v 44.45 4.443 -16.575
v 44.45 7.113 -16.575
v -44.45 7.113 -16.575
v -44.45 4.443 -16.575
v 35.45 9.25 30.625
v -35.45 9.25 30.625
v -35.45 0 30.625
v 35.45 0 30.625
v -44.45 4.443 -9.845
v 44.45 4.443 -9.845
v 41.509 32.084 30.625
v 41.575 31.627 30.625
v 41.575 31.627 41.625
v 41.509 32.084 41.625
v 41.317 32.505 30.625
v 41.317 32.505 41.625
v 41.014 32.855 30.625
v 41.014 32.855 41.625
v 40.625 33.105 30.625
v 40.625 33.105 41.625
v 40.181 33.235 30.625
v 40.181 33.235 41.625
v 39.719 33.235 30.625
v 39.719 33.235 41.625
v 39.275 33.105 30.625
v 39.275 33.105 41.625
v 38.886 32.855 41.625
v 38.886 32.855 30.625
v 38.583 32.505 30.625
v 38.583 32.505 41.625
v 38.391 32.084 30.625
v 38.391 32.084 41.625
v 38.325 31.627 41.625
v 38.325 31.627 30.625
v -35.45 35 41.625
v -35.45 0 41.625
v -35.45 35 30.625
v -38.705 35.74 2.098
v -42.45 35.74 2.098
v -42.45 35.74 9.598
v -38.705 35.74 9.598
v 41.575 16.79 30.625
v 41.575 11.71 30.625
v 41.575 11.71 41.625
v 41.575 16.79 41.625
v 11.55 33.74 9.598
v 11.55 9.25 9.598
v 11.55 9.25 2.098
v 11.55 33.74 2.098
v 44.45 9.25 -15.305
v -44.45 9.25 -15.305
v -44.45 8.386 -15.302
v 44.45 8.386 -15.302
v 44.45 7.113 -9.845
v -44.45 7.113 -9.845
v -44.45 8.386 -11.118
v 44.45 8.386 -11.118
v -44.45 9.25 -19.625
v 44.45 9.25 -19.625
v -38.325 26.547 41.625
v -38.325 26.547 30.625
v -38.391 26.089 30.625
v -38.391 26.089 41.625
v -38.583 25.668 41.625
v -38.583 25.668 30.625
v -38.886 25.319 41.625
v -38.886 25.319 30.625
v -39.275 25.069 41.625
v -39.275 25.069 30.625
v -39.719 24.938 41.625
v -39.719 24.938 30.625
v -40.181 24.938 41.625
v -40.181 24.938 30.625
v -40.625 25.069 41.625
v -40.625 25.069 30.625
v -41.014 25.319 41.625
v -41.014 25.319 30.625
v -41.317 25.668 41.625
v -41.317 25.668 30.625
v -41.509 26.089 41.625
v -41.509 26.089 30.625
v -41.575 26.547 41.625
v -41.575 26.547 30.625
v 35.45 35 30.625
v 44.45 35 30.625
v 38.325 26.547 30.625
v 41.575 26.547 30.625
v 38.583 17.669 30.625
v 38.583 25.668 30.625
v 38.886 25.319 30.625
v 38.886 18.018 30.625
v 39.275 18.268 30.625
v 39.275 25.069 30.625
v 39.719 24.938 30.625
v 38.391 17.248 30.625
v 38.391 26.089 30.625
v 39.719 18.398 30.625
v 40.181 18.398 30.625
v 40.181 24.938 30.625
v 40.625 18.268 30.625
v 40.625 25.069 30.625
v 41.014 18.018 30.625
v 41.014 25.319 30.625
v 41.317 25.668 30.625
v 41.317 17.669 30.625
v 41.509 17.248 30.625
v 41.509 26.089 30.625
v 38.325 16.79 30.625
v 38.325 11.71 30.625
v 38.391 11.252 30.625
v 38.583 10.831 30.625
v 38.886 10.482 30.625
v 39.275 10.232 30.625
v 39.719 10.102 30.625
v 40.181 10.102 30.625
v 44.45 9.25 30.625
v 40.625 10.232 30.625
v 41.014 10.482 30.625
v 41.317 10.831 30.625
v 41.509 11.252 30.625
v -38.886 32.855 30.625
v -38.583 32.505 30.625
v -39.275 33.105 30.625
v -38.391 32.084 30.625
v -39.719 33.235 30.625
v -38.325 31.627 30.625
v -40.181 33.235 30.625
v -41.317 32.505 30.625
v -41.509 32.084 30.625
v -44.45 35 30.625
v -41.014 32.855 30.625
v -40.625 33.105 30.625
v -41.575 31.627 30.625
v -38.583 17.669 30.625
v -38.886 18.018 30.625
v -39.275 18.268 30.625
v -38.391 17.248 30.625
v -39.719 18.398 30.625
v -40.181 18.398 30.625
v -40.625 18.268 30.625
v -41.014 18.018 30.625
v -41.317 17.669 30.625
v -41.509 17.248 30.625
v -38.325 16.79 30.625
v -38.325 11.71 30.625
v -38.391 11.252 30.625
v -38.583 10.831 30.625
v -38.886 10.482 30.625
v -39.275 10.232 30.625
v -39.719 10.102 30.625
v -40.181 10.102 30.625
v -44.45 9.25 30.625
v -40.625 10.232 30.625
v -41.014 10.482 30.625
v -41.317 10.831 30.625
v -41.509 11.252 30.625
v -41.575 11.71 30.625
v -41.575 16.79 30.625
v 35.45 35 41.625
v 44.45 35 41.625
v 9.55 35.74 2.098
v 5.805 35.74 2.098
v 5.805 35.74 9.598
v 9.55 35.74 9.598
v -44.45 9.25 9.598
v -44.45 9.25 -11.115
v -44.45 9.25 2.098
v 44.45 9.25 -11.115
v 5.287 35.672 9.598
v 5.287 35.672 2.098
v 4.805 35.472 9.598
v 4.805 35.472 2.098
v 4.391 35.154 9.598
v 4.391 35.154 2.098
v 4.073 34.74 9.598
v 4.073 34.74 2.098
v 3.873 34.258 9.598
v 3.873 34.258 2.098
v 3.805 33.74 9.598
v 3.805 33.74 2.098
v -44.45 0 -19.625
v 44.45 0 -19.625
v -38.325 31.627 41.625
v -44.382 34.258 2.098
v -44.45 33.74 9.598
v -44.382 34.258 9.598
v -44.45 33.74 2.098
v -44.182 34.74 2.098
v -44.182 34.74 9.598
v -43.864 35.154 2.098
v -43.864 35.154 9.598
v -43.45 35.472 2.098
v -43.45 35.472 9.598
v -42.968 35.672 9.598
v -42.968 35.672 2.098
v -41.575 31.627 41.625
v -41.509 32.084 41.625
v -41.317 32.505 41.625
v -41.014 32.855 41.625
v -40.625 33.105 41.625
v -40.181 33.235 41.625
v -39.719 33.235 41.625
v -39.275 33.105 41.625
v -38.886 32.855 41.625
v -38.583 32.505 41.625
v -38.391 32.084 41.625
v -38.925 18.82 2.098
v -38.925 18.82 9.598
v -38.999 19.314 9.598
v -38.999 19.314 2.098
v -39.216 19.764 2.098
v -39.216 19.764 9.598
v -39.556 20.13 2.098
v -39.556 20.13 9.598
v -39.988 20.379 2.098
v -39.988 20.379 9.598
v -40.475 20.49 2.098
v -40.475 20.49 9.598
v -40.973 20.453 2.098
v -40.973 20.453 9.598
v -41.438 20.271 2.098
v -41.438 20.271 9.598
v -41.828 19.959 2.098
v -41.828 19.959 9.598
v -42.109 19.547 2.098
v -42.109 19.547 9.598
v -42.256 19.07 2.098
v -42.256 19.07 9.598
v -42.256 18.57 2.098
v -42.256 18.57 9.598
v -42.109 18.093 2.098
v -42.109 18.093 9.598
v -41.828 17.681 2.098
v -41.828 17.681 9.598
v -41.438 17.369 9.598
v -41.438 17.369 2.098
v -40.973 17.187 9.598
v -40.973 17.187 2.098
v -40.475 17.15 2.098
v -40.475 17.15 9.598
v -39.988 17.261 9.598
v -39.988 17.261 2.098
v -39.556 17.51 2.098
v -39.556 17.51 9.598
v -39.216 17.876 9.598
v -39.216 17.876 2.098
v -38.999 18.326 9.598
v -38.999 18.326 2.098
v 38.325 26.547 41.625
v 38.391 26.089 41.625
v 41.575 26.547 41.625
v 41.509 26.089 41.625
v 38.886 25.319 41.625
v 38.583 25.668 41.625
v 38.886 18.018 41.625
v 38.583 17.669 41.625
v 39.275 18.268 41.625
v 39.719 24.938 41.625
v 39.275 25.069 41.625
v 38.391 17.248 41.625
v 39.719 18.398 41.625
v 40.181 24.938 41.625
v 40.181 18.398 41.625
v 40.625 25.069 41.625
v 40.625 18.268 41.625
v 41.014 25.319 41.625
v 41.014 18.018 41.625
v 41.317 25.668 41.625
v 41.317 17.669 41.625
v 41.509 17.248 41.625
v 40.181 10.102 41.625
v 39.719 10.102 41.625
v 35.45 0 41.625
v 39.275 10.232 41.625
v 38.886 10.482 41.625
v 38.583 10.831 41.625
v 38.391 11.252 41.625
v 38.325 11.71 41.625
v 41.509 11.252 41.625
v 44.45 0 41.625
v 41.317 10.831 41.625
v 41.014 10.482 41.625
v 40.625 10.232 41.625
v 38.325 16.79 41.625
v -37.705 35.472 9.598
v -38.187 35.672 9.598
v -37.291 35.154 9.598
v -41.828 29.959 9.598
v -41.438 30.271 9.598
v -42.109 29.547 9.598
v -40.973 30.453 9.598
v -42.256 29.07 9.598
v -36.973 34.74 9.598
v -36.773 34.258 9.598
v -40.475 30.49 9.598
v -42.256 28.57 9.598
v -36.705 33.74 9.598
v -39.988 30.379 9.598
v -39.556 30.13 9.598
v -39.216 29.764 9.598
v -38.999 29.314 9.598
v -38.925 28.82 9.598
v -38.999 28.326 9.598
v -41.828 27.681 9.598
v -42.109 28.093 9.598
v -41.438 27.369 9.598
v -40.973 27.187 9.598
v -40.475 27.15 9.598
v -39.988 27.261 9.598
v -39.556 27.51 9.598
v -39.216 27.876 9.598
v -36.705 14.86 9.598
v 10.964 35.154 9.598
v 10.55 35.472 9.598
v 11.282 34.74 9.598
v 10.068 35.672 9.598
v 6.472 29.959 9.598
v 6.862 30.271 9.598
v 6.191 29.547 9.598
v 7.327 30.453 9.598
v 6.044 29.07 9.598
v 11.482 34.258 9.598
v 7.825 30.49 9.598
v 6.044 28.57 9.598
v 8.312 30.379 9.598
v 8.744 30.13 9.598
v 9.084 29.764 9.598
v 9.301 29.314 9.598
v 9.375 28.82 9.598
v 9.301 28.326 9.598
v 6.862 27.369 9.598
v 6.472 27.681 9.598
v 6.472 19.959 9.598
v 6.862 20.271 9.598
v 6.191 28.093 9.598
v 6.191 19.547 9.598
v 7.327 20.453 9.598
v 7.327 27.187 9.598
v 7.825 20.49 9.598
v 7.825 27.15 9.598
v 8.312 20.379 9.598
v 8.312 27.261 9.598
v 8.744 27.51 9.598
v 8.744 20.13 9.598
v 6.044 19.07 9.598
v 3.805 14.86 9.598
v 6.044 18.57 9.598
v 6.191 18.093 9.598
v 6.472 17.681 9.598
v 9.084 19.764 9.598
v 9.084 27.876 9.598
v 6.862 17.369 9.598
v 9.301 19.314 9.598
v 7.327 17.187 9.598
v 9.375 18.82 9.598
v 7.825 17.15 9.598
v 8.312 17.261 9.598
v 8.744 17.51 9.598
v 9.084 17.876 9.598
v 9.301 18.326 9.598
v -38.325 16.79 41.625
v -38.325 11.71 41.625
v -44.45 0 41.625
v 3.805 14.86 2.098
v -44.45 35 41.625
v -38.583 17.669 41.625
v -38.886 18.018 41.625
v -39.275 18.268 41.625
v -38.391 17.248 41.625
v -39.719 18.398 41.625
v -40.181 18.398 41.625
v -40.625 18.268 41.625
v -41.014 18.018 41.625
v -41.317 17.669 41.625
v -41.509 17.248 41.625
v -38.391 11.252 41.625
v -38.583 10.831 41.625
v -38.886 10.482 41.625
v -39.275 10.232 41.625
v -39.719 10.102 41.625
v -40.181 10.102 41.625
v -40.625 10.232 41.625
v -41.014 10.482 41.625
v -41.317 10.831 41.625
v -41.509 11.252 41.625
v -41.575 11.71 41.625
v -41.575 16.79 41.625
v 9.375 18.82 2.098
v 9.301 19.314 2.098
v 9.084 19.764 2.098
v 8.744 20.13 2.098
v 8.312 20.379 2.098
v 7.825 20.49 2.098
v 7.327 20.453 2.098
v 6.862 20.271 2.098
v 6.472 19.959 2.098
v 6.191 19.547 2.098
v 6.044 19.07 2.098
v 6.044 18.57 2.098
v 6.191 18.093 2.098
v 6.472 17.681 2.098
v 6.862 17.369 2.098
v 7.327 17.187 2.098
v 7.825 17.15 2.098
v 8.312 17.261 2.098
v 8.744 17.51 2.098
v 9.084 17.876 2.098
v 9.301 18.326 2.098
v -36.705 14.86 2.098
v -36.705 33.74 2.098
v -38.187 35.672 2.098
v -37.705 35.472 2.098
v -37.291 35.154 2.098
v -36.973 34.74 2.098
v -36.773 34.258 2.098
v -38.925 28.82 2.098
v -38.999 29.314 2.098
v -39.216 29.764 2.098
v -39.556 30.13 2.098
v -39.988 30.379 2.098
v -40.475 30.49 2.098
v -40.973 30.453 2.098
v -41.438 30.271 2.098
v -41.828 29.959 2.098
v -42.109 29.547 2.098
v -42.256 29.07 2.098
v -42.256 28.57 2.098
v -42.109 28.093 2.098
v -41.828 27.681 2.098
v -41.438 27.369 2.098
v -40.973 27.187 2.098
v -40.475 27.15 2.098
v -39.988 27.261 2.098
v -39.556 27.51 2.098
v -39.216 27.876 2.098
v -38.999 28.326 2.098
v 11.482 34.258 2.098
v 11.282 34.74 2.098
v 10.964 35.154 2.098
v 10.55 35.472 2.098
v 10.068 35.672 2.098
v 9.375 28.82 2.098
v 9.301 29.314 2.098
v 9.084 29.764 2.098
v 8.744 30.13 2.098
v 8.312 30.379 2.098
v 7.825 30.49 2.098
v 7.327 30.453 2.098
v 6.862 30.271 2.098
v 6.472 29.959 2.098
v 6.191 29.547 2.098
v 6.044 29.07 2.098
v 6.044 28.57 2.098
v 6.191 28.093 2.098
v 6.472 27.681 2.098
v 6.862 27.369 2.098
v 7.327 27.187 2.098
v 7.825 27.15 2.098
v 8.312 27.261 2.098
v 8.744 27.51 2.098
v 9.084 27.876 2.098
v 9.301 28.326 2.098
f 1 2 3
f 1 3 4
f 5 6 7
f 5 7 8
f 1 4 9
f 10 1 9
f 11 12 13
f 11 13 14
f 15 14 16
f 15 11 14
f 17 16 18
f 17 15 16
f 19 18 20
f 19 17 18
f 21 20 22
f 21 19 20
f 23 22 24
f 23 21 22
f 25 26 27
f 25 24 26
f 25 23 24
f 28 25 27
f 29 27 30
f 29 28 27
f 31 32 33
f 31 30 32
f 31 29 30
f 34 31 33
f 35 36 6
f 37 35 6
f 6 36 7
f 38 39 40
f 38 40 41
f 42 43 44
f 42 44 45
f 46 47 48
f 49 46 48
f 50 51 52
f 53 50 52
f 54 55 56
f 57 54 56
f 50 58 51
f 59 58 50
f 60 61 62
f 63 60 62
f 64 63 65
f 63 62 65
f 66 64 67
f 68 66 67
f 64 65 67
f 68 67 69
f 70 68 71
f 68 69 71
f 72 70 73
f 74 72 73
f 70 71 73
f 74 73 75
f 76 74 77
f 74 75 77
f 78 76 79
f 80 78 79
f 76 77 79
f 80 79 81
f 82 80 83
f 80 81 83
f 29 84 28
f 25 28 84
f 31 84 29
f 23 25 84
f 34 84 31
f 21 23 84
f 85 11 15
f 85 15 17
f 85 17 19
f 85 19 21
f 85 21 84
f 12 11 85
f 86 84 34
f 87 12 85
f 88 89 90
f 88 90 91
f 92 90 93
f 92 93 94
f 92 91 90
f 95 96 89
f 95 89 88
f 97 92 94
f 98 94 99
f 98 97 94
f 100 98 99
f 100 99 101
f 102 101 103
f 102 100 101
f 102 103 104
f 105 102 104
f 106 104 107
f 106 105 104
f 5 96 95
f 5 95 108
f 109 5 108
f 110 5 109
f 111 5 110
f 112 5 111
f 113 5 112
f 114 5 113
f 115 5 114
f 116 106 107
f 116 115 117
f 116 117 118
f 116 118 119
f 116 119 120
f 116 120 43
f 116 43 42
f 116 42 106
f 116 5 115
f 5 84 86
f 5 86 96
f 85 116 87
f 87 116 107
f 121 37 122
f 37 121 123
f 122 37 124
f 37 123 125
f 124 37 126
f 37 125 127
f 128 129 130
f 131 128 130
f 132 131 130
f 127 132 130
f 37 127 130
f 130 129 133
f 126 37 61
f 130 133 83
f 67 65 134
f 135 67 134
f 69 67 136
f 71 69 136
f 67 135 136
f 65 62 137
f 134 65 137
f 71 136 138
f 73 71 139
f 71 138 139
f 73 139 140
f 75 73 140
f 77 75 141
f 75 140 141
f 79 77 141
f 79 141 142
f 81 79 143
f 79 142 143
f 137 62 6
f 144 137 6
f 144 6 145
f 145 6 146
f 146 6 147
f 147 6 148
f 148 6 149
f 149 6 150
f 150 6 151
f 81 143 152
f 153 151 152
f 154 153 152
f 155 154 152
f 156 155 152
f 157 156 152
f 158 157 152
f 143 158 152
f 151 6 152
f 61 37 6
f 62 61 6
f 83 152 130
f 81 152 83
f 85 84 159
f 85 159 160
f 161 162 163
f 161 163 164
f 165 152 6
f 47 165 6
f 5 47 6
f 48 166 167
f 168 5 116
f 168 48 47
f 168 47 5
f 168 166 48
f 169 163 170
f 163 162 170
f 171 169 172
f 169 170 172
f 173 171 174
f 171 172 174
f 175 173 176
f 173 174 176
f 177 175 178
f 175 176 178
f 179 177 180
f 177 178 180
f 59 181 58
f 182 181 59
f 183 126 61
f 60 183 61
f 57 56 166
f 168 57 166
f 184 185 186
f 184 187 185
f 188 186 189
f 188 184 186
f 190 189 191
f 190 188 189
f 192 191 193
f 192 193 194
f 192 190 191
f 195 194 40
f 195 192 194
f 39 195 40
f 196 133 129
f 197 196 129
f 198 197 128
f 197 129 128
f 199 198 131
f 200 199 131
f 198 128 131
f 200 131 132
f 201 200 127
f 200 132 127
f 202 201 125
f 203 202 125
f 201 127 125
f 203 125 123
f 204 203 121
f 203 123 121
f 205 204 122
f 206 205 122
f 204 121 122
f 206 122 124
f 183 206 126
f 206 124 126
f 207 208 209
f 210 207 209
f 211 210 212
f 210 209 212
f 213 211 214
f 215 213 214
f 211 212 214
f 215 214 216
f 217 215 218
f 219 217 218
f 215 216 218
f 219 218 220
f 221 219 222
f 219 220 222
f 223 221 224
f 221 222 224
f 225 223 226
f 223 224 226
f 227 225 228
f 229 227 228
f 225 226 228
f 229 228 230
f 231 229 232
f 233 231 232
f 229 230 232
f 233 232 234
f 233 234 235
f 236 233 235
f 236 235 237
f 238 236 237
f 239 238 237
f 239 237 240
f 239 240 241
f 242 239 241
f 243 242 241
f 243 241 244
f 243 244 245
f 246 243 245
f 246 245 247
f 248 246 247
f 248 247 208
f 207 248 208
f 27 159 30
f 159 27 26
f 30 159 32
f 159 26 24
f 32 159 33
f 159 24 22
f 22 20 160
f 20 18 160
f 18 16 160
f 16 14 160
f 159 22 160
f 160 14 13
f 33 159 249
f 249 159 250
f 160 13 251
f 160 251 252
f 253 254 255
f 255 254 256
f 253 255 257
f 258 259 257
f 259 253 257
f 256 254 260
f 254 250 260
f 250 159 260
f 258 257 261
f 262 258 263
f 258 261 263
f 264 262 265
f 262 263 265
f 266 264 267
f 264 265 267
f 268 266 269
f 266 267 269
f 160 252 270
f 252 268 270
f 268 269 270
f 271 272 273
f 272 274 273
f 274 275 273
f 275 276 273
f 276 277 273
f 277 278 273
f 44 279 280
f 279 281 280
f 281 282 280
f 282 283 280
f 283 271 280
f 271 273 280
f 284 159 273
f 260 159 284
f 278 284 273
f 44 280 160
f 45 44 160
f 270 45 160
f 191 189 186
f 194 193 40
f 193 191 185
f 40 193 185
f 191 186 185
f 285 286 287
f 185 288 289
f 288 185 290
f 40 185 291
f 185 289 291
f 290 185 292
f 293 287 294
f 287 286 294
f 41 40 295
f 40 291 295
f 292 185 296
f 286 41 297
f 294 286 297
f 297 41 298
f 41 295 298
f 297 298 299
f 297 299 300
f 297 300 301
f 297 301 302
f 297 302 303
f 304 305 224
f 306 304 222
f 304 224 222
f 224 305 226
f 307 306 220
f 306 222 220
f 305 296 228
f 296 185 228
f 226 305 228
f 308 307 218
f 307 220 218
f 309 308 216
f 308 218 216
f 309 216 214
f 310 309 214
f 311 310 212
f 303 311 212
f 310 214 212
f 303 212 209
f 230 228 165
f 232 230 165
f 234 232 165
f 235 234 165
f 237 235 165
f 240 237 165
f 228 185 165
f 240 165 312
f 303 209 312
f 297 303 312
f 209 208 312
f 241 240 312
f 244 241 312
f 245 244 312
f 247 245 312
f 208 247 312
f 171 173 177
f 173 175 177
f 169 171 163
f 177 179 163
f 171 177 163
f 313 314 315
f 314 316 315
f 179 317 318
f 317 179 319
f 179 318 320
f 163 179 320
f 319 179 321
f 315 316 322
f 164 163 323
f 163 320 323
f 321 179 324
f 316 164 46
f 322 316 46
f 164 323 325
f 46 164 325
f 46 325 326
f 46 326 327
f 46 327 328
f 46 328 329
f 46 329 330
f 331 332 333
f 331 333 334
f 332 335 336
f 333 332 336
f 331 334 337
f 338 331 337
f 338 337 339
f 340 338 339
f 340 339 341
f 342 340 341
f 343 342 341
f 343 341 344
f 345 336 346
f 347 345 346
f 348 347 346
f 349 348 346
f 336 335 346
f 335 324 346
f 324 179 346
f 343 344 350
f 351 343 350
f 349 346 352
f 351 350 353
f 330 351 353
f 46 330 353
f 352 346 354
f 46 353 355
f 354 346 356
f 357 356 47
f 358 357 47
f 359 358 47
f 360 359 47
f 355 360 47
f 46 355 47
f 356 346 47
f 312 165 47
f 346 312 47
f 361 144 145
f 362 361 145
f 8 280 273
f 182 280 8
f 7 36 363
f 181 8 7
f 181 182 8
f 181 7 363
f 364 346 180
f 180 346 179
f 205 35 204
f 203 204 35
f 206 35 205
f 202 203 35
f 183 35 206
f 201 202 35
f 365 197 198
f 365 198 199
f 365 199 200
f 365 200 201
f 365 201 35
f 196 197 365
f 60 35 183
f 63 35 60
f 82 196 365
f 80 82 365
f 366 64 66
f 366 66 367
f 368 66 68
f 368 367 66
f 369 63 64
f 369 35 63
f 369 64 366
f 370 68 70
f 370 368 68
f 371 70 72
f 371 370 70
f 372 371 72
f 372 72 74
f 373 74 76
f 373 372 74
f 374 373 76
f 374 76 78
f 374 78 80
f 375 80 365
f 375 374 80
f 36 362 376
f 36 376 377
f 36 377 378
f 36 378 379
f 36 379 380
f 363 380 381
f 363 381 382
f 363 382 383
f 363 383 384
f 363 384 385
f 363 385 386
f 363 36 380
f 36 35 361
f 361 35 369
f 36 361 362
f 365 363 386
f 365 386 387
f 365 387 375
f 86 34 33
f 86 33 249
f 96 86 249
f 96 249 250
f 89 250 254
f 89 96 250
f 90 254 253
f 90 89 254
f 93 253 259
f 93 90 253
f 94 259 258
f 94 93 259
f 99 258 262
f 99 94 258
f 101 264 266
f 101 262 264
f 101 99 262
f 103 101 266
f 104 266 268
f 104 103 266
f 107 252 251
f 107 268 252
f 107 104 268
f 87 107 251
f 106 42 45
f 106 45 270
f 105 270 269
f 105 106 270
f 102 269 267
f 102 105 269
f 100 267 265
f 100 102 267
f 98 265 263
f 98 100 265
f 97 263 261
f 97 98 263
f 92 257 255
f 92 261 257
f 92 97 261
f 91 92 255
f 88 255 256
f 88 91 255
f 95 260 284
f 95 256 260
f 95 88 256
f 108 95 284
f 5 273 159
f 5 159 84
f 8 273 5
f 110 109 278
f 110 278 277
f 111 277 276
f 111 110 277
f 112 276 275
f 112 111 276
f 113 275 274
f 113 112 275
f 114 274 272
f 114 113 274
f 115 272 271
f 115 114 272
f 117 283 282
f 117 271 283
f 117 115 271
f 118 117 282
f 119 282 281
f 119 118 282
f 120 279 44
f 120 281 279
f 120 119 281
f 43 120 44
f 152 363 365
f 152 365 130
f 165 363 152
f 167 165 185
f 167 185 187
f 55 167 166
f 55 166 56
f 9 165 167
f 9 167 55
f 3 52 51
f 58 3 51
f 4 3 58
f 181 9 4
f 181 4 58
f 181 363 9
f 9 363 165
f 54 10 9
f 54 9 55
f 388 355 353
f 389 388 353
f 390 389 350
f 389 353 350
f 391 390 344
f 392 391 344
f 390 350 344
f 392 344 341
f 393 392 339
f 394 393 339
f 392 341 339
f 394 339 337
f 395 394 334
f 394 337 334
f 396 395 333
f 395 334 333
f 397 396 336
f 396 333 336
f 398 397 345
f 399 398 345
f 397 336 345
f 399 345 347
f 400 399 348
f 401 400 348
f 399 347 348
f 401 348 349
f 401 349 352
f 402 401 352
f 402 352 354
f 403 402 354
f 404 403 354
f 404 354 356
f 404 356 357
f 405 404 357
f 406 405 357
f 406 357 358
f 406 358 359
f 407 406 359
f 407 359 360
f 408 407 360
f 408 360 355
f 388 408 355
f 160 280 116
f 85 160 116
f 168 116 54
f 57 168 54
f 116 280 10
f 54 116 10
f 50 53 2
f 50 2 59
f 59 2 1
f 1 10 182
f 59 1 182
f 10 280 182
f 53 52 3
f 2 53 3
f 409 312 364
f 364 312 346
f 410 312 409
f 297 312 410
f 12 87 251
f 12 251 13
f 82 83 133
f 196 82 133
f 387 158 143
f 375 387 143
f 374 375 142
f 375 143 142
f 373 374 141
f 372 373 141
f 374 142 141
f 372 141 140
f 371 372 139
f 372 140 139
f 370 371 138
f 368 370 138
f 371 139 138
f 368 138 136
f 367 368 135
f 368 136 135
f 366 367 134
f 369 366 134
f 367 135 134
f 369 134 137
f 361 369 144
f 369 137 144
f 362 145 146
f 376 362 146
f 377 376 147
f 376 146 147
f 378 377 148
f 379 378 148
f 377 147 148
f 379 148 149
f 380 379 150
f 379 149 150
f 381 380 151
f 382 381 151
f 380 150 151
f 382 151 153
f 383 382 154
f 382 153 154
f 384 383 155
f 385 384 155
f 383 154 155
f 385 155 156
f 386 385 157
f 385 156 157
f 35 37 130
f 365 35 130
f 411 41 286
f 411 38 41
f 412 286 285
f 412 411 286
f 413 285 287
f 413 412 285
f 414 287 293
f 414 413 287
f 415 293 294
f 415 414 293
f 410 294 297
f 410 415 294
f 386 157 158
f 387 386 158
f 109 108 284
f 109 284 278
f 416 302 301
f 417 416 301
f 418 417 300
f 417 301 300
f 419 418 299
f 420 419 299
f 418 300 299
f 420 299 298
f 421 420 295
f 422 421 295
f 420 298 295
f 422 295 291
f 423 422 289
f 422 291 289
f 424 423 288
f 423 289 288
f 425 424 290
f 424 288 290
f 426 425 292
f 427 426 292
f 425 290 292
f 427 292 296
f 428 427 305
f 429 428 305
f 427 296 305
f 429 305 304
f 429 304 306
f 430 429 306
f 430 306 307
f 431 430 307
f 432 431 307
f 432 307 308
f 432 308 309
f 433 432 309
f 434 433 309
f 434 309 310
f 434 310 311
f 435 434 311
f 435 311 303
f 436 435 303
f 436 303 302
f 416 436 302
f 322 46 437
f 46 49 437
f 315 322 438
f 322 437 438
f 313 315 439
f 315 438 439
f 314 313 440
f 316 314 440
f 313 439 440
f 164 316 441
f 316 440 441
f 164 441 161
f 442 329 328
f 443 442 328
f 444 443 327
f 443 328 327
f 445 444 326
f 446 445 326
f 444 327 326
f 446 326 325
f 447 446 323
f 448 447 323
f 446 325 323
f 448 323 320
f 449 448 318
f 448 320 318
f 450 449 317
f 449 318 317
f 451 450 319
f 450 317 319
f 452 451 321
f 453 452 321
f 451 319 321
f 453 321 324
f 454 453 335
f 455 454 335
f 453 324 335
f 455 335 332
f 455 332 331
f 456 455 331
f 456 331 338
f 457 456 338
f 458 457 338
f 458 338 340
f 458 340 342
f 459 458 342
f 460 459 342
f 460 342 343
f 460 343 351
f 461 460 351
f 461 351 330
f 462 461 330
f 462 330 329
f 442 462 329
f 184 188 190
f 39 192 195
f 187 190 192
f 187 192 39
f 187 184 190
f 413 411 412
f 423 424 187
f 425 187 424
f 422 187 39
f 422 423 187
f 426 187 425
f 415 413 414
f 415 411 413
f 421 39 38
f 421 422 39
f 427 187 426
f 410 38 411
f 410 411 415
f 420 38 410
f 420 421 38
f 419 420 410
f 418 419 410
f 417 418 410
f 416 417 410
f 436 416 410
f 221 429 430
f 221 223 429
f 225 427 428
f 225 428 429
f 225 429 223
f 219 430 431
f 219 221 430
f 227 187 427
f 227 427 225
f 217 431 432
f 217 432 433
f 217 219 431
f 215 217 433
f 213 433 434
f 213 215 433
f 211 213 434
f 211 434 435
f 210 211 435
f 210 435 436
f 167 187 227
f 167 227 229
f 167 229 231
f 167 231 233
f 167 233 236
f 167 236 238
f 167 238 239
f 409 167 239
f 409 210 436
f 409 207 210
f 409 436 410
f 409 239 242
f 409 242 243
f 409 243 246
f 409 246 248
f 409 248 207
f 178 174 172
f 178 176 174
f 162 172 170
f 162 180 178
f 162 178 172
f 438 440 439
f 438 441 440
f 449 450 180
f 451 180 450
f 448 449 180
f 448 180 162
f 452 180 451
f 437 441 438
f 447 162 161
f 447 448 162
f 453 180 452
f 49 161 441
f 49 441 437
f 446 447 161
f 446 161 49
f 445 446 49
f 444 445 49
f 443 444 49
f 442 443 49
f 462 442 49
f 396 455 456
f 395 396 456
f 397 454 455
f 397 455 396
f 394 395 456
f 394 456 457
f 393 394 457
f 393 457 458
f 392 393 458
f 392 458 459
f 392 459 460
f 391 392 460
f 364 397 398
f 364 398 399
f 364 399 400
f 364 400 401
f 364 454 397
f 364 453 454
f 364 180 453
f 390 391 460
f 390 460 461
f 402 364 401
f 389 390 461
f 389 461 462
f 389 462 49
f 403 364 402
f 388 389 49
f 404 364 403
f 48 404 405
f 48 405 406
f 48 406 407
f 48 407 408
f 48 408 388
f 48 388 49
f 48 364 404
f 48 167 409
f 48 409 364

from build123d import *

# Parameters (mm, degrees)
SKETCH1_W           = 88.9
SKETCH1_H           = 39.25
BOSS_EXTRUDE1_DEPTH = 9.25
SKETCH2_W           = 56
SKETCH2_H           = 7.5
BOSS_EXTRUDE2_DEPTH = 26.49
SKETCH3_W           = 40.51
SKETCH3_H           = 20.88
CUT_EXTRUDE2_DEPTH  = 8.49
SKETCH5_R           = 1.675
CUT_EXTRUDE3_DEPTH  = 8.49
CUT_EXTRUDE4_DEPTH  = 91.49
FILLET1_R           = 2
FILLET2_R           = 2
SKETCH12_W          = 88.9
SKETCH12_H          = 9.25
BOSS_EXTRUDE3_DEPTH = 11
SKETCH16_W          = 9
SKETCH16_H          = 11
BOSS_EXTRUDE5_DEPTH = 35
CUT_EXTRUDE5_DEPTH  = 16
CUT_EXTRUDE6_DEPTH  = 16


with BuildPart() as part:
    # Sketch1 → Boss-Extrude1 (new body)
    with BuildSketch(Plane(origin=(0, 0, 0), x_dir=(1, 0, 0), z_dir=(0, 1, 0))):
        Rectangle(SKETCH1_W, SKETCH1_H)
    extrude(amount=BOSS_EXTRUDE1_DEPTH)

    # Sketch2 → Boss-Extrude2 (add)
    with BuildSketch(Plane(origin=(0, 9.25, 0), x_dir=(1, 0, 0), z_dir=(0, 1, 0))):
        with Locations((-16.45, -5.848195432)):
            Rectangle(SKETCH2_W, SKETCH2_H)
    extrude(amount=BOSS_EXTRUDE2_DEPTH)

    # Sketch3 → Cut-Extrude2 (cut)
    with BuildSketch(Plane.XY.offset(9.598195432)):
        with Locations((-16.45, 25.3)):
            Rectangle(SKETCH3_W, SKETCH3_H)
    extrude(amount=-CUT_EXTRUDE2_DEPTH, mode=Mode.SUBTRACT)

    # Sketch5 → Cut-Extrude3 (cut)
    with BuildSketch(Plane.XY.offset(9.598195432)):
        with Locations((-40.6, 18.82)):
            Circle(SKETCH5_R)
        with Locations((-40.6, 28.82)):
            Circle(SKETCH5_R)
        with Locations((7.7, 18.82)):
            Circle(SKETCH5_R)
        with Locations((7.7, 28.82)):
            Circle(SKETCH5_R)
    extrude(amount=-CUT_EXTRUDE3_DEPTH, mode=Mode.SUBTRACT)

    # Sketch10 → Cut-Extrude4 (cut)
    with BuildSketch(Plane.ZY.offset(44.45)):
        Polygon((-16.575, 4.44331134), (-9.845, 4.44331134), (-9.845, 7.11331134), (-11.117792206, 8.386103546), (-11.115, 9.25), (-15.305, 9.25), (-15.302207794, 8.386103546), (-16.575, 7.11331134), align=None)
    extrude(amount=-CUT_EXTRUDE4_DEPTH, mode=Mode.SUBTRACT)

    # Fillet1
    fillet1_edges = [part.edges().sort_by_distance(p)[0] for p in [
        (-44.45, 35.74, 5.848195432),
        (-36.705, 35.74, 5.848195432),
    ]]
    fillet(fillet1_edges, radius=FILLET1_R)

    # Fillet2
    fillet2_edges = [part.edges().sort_by_distance(p)[0] for p in [
        (11.55, 35.74, 5.848195432),
        (3.805, 35.74, 5.848195432),
    ]]
    fillet(fillet2_edges, radius=FILLET2_R)

    # Sketch12 → Boss-Extrude3 (add)
    with BuildSketch(Plane.XY.offset(19.625)):
        with Locations((0, 4.625)):
            Rectangle(SKETCH12_W, SKETCH12_H)
    extrude(amount=BOSS_EXTRUDE3_DEPTH)

    # Sketch16 → Boss-Extrude5 (add)
    with BuildSketch(Plane(origin=(0, 0, 0), x_dir=(1, 0, 0), z_dir=(0, 1, 0))):
        with Locations((39.95, -36.125)):
            Rectangle(SKETCH16_W, SKETCH16_H)
    boss_extrude5 = extrude(amount=BOSS_EXTRUDE5_DEPTH)

    # Sketch17 → Cut-Extrude5 (cut)
    with BuildSketch(Plane(origin=(0, 0, 30.625), x_dir=(-1, 0, 0), z_dir=(0, 0, -1))):
        with BuildLine():
            Line((-41.575, 11.71), (-41.575, 16.79))
            ThreePointArc((-41.575, 16.79), (-39.95, 18.415), (-38.325, 16.79))
            Line((-38.325, 16.79), (-38.325, 11.71))
            ThreePointArc((-38.325, 11.71), (-39.95, 10.085), (-41.575, 11.71))
        make_face()
    cut_extrude5 = extrude(amount=-CUT_EXTRUDE5_DEPTH, mode=Mode.SUBTRACT)

    # Sketch19 → Cut-Extrude6 (cut)
    with BuildSketch(Plane(origin=(0, 0, 30.625), x_dir=(-1, 0, 0), z_dir=(0, 0, -1))):
        with BuildLine():
            Line((-41.575, 26.546678497), (-41.575, 31.626678497))
            ThreePointArc((-41.575, 31.626678497), (-39.95, 33.251678497), (-38.325, 31.626678497))
            Line((-38.325, 31.626678497), (-38.325, 26.546678497))
            ThreePointArc((-38.325, 26.546678497), (-39.95, 24.921678497), (-41.575, 26.546678497))
        make_face()
    cut_extrude6 = extrude(amount=-CUT_EXTRUDE6_DEPTH, mode=Mode.SUBTRACT)

    # Mirror1: Boss-Extrude5, Cut-Extrude5, Cut-Extrude6 across plane
    add(boss_extrude5.mirror(Plane(origin=(0, 0, 0), x_dir=(0, 0, 1), z_dir=(1, 0, 0))))
    add(cut_extrude5.mirror(Plane(origin=(0, 0, 0), x_dir=(0, 0, 1), z_dir=(1, 0, 0))), mode=Mode.SUBTRACT)
    add(cut_extrude6.mirror(Plane(origin=(0, 0, 0), x_dir=(0, 0, 1), z_dir=(1, 0, 0))), mode=Mode.SUBTRACT)


solid = part.part
